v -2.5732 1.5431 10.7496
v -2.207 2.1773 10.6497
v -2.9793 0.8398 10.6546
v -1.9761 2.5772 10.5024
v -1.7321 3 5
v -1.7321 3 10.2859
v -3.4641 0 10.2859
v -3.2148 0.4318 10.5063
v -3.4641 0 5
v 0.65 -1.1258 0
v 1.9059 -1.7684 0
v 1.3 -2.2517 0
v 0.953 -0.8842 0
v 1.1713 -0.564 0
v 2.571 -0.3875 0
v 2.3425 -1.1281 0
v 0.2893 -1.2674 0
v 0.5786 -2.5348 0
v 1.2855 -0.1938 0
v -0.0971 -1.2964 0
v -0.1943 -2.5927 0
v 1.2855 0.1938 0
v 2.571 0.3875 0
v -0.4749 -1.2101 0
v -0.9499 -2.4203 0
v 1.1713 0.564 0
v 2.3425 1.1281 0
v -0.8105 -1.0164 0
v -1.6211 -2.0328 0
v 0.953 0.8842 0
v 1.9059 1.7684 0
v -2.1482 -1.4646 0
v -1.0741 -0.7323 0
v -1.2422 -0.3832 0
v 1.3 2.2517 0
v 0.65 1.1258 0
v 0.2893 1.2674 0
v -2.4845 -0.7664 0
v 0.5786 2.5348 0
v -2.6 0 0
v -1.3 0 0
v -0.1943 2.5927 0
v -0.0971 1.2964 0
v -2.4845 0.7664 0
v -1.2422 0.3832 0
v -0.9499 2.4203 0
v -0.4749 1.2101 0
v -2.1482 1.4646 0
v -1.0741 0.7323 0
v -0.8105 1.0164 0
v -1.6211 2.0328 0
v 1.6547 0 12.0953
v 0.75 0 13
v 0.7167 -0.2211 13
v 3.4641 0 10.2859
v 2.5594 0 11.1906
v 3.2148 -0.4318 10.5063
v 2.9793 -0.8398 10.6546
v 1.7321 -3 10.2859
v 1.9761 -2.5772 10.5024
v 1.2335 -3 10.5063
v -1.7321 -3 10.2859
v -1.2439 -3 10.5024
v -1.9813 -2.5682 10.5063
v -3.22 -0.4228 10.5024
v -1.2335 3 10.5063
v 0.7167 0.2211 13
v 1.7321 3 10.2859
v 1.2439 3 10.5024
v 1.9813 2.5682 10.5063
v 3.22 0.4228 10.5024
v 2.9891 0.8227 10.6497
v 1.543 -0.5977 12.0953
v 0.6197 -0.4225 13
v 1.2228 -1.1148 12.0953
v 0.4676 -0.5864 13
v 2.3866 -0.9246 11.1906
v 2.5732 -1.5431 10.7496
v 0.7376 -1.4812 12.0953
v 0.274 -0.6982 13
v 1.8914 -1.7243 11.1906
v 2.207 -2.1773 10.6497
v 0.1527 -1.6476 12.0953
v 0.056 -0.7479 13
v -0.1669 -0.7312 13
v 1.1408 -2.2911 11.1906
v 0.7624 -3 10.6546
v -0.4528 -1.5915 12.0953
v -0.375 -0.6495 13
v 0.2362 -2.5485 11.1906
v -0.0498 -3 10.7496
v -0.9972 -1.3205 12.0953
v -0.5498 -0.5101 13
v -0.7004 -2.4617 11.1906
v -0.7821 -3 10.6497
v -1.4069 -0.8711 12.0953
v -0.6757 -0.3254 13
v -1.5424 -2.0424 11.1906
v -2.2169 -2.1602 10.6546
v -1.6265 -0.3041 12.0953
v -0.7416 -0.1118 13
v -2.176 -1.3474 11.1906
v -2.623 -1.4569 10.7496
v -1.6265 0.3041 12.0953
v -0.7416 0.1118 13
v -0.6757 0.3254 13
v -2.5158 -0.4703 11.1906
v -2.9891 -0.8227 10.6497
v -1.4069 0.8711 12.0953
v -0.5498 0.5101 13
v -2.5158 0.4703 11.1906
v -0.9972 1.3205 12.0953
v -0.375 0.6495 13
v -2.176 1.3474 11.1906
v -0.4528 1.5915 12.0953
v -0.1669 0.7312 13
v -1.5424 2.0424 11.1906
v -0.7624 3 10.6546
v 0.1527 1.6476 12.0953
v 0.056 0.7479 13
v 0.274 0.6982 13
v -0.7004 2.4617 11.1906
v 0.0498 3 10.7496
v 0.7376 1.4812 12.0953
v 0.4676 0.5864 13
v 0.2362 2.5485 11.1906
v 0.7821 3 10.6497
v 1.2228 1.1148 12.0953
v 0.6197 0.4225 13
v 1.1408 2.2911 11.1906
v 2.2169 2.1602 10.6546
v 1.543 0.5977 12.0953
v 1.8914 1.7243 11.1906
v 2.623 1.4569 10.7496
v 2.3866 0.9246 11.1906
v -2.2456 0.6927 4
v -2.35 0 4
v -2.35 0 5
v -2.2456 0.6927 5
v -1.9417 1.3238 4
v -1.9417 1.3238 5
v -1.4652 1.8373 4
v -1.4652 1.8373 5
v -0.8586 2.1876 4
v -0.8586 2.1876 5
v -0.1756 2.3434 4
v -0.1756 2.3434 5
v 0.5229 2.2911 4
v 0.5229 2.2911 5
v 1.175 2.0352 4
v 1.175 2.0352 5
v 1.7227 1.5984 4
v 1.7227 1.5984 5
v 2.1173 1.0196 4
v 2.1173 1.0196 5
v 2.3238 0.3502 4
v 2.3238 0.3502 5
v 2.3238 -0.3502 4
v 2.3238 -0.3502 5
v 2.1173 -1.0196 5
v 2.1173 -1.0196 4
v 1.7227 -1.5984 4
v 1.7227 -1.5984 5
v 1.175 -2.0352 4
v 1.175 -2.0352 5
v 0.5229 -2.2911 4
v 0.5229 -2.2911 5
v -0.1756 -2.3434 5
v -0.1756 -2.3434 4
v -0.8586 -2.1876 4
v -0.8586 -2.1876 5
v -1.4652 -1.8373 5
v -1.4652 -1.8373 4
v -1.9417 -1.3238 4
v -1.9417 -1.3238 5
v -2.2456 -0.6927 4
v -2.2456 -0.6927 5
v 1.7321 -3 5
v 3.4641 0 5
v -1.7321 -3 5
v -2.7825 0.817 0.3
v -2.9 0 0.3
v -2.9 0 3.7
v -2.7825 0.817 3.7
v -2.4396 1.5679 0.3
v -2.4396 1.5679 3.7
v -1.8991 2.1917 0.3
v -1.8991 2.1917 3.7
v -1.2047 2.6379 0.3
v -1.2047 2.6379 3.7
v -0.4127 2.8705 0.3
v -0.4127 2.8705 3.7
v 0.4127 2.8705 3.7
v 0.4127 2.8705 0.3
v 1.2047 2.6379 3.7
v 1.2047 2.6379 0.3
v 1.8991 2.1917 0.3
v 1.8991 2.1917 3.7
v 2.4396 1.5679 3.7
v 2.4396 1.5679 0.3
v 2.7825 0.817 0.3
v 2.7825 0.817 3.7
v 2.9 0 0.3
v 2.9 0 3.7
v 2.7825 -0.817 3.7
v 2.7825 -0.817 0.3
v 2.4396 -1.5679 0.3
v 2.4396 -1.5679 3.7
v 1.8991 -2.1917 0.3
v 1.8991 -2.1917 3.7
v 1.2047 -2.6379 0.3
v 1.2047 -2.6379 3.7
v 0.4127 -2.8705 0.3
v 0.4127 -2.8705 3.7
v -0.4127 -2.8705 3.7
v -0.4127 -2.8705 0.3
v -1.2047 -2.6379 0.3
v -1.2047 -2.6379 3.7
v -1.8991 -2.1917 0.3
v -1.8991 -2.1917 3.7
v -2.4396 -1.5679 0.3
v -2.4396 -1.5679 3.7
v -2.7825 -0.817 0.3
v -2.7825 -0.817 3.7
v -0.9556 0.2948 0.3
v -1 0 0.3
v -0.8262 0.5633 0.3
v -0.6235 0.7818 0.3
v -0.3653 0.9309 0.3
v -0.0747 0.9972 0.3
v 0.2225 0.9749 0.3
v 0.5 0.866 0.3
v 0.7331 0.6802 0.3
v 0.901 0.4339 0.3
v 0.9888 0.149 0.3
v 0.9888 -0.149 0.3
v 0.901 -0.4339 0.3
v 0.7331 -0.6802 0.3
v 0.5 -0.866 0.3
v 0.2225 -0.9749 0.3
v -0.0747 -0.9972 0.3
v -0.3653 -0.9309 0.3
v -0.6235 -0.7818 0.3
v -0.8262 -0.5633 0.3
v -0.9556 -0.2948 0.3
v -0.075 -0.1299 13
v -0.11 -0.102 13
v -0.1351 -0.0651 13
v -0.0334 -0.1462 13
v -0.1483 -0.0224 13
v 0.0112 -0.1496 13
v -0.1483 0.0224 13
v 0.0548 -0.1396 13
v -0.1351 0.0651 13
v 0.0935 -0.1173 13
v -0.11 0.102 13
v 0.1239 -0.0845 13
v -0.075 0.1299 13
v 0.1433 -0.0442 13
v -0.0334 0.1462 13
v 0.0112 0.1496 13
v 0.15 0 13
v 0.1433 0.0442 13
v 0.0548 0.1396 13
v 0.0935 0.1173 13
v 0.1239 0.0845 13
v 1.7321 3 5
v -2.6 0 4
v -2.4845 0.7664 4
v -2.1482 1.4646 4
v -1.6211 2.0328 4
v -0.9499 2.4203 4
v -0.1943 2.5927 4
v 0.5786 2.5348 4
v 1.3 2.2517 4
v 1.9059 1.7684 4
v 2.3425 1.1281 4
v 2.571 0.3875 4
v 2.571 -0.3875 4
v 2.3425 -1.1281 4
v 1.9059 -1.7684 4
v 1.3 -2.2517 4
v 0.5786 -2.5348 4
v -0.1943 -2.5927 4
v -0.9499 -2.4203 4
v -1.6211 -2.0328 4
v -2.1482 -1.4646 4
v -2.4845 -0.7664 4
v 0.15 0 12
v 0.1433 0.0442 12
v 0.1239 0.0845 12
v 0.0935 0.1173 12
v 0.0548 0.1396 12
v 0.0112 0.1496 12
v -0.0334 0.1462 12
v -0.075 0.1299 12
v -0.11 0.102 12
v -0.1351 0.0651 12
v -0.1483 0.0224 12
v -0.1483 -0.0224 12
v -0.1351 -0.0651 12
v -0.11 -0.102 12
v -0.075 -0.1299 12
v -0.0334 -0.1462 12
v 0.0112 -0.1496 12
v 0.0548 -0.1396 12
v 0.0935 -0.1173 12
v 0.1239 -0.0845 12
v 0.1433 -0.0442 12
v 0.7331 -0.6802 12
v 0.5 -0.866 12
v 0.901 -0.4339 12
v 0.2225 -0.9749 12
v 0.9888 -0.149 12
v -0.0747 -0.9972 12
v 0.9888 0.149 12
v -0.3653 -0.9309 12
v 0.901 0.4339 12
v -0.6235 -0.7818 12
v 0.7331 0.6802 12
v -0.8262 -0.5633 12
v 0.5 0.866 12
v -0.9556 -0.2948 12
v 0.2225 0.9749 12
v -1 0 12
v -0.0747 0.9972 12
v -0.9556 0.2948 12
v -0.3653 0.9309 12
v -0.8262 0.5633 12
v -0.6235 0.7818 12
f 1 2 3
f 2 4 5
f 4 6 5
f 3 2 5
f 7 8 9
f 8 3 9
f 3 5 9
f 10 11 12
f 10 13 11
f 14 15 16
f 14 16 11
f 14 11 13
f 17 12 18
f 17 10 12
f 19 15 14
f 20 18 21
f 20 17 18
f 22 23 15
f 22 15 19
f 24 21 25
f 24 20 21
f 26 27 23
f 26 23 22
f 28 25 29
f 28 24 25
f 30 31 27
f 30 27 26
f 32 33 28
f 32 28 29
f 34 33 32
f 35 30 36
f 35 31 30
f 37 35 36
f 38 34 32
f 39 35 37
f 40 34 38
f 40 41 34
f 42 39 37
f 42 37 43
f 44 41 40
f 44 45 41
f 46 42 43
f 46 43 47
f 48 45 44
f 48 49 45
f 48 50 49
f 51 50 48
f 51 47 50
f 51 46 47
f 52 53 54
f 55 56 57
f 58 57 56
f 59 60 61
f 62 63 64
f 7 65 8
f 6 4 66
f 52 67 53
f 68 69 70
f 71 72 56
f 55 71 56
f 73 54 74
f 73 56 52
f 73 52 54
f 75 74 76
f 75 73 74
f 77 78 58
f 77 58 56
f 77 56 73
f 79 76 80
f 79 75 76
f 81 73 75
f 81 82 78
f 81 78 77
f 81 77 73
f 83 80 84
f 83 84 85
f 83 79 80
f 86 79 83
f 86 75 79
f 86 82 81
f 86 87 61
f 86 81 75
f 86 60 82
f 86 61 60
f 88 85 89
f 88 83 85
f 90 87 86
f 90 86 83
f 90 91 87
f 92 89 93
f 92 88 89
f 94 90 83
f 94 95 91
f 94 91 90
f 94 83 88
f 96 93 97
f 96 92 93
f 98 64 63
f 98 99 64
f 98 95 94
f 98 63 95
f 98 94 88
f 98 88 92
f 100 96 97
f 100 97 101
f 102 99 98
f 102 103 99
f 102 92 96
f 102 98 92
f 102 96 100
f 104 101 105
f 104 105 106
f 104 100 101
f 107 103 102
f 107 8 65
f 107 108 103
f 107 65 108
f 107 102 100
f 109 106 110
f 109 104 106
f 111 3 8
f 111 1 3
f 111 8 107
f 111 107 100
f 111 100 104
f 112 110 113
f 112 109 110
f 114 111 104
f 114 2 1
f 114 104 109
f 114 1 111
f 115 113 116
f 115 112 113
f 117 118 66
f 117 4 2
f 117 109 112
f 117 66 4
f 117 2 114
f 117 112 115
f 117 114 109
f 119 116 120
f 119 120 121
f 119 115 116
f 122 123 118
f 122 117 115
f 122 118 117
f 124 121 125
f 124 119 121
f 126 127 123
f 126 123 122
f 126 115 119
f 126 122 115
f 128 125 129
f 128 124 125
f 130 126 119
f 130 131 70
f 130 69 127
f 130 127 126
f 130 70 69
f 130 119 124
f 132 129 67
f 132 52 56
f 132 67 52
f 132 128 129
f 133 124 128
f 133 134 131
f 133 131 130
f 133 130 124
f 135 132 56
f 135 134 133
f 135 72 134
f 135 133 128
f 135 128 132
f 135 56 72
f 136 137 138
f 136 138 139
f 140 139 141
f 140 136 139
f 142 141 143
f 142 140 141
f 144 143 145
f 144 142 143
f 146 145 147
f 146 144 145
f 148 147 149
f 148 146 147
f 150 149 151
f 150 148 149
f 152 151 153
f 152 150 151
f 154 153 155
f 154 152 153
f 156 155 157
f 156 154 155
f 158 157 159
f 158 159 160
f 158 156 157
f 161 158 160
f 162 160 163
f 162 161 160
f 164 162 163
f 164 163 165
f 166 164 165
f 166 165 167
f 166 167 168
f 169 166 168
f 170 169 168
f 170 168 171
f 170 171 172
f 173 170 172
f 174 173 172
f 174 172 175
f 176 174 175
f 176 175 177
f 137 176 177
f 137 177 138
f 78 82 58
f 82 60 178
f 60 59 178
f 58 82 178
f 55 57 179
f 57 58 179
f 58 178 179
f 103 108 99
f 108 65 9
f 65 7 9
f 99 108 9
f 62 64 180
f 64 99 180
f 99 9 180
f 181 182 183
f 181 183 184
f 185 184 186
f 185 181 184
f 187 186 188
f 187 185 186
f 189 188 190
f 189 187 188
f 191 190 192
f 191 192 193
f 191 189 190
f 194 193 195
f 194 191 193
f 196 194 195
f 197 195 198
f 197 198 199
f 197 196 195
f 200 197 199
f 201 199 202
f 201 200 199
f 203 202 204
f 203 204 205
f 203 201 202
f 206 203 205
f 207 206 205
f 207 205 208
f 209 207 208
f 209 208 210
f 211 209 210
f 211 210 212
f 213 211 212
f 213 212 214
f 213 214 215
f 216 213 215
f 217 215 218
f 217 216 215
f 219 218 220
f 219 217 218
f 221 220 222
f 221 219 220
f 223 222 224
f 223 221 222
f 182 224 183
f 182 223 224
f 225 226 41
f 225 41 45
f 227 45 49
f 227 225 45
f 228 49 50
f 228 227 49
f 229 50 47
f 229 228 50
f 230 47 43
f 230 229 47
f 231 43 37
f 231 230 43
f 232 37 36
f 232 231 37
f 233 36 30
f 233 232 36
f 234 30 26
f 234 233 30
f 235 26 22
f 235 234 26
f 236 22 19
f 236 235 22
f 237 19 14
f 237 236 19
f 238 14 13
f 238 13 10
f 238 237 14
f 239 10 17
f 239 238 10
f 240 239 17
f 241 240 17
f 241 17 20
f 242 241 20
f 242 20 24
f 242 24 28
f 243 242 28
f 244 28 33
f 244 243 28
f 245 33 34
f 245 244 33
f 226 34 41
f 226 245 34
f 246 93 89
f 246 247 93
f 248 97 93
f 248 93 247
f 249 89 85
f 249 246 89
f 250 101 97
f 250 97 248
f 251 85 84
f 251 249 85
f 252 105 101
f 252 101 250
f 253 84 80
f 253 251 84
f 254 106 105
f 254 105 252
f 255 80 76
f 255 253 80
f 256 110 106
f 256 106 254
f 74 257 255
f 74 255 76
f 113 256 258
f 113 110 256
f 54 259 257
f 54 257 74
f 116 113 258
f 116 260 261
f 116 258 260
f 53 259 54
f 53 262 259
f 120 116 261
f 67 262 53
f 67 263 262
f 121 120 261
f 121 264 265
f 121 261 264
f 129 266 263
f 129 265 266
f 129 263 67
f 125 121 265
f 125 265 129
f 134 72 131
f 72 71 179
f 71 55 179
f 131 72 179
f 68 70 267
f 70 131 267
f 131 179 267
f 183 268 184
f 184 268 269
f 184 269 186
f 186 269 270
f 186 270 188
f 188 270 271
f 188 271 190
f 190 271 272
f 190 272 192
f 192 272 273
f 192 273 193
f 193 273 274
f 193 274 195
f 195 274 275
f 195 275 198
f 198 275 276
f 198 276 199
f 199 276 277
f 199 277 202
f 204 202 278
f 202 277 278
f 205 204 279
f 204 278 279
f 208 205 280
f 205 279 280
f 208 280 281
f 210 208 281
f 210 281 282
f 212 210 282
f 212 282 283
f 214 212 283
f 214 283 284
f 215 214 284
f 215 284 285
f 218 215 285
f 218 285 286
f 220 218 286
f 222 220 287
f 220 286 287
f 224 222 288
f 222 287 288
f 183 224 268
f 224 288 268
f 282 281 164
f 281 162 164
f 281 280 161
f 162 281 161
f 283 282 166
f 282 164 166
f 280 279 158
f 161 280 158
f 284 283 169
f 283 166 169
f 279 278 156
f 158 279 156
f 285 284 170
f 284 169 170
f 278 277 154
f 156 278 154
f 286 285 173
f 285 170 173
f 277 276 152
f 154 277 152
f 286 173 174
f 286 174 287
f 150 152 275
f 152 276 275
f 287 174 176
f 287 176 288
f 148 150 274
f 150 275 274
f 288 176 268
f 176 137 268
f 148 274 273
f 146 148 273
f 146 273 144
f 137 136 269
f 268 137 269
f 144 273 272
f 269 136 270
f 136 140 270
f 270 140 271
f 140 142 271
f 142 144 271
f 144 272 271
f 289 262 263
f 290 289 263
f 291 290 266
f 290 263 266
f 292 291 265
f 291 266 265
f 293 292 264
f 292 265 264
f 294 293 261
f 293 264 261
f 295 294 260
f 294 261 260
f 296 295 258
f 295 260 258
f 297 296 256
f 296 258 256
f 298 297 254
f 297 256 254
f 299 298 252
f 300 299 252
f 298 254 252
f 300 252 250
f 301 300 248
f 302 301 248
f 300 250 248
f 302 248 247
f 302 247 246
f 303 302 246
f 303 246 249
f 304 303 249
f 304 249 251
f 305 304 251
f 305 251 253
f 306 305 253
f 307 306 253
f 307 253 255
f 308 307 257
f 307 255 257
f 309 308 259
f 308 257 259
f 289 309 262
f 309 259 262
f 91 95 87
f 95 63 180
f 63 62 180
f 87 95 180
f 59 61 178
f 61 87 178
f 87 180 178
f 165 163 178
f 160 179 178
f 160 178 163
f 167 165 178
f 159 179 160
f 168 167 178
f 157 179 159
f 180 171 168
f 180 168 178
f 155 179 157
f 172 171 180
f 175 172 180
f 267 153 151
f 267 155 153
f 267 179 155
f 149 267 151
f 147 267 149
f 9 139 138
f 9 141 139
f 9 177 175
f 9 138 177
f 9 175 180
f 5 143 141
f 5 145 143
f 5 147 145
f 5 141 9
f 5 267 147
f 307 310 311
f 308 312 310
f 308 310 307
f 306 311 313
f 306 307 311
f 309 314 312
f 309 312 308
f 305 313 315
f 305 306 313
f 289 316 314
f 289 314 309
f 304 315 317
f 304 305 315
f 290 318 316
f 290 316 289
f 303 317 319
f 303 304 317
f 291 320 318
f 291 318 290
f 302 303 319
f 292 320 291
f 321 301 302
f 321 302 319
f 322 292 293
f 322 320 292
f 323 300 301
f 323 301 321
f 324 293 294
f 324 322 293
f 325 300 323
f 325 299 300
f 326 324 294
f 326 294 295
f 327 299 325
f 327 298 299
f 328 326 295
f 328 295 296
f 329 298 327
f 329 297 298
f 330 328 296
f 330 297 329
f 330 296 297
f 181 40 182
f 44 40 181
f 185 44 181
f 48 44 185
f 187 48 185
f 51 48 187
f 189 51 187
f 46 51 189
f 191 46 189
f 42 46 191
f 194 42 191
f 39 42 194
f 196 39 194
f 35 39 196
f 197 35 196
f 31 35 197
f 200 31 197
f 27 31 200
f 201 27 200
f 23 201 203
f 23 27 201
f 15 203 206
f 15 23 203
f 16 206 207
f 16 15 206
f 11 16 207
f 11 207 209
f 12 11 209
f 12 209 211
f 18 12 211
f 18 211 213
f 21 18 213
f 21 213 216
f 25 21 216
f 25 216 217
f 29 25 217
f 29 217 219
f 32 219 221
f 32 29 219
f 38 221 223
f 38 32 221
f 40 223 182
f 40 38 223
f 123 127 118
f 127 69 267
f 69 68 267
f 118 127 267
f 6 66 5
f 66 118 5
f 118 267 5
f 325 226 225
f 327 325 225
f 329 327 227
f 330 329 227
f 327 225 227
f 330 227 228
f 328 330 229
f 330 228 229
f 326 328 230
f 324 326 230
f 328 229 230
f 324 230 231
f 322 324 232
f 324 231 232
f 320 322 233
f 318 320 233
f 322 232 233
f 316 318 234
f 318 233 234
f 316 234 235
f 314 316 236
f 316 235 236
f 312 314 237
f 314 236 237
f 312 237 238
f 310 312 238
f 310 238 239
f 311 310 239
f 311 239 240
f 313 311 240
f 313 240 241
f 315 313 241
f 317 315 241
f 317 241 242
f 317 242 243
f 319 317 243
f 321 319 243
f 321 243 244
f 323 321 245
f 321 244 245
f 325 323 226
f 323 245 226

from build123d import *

# Parameters (mm, degrees)
EXTRUDE_1_DEPTH     = 13
SKETCH_2_OUTSIDE_W  = 38.11
SKETCH_2_OUTSIDE_H  = 37.182
SKETCH_2_OUTSIDE_R  = 0.75
CUT_EXTRUDE_1_DEPTH = 13
CUT_EXTRUDE_1_TAPER = 45
SKETCH_3_OUTSIDE_W  = 12.11
SKETCH_3_OUTSIDE_H  = 11.182
SKETCH_3_OUTSIDE_R  = 2.35
CUT_EXTRUDE_2_DEPTH = 5
SKETCH_4_R          = 1
CUT_EXTRUDE_3_DEPTH = 12
SKETCH_5_R          = 0.15
CUT_EXTRUDE_4_DEPTH = 1
SKETCH_6_R          = 2.9
SKETCH_6_R_2        = 2.35
EXTRUDE_2_DEPTH     = 4
CHAMFER_1_SIZE      = 0.3


with BuildPart() as part:
    # Эскиз1 → Бобышка-Вытянуть1 (new body)
    with BuildSketch(Plane.XY):
        Polygon((3.464101615, 0), (1.732050808, 3), (-1.732050808, 3), (-3.464101615, 0), (-1.732050808, -3), (1.732050808, -3), align=None)
    extrude(amount=EXTRUDE_1_DEPTH)

    # Эскиз2 outside → Вырез-Вытянуть1 (cut)
    with BuildSketch(Plane.XY.offset(13)):
        Rectangle(SKETCH_2_OUTSIDE_W, SKETCH_2_OUTSIDE_H)
        Circle(SKETCH_2_OUTSIDE_R, mode=Mode.SUBTRACT)
    extrude(amount=-CUT_EXTRUDE_1_DEPTH, taper=CUT_EXTRUDE_1_TAPER, mode=Mode.SUBTRACT)

    # Эскиз3 outside → Вырез-Вытянуть2 (cut)
    with BuildSketch(Plane(origin=(0, 0, 0), x_dir=(-1, 0, 0), z_dir=(0, 0, -1))):
        Rectangle(SKETCH_3_OUTSIDE_W, SKETCH_3_OUTSIDE_H)
        Circle(SKETCH_3_OUTSIDE_R, mode=Mode.SUBTRACT)
    extrude(amount=-CUT_EXTRUDE_2_DEPTH, mode=Mode.SUBTRACT)

    # Эскиз4 → Вырез-Вытянуть3 (cut)
    with BuildSketch(Plane(origin=(0, 0, 0), x_dir=(-1, 0, 0), z_dir=(0, 0, -1))):
        Circle(SKETCH_4_R)
    extrude(amount=-CUT_EXTRUDE_3_DEPTH, mode=Mode.SUBTRACT)

    # Эскиз5 → Вырез-Вытянуть4 (cut)
    with BuildSketch(Plane.XY.offset(13)):
        Circle(SKETCH_5_R)
    extrude(amount=-CUT_EXTRUDE_4_DEPTH, mode=Mode.SUBTRACT)

    # Эскиз6 → Бобышка-Вытянуть2 (add)
    with BuildSketch(Plane(origin=(0, 0, 0), x_dir=(-1, 0, 0), z_dir=(0, 0, -1))):
        Circle(SKETCH_6_R)
        Circle(SKETCH_6_R_2, mode=Mode.SUBTRACT)
    extrude(amount=-EXTRUDE_2_DEPTH)

    # Фаска1
    chamfer_1_edges = [part.edges().sort_by_distance(p)[0] for p in [
        (1, 0, 0),
        (2.9, 0, 4),
        (2.9, 0, 0),
    ]]
    chamfer(chamfer_1_edges, length=CHAMFER_1_SIZE)


solid = part.part
